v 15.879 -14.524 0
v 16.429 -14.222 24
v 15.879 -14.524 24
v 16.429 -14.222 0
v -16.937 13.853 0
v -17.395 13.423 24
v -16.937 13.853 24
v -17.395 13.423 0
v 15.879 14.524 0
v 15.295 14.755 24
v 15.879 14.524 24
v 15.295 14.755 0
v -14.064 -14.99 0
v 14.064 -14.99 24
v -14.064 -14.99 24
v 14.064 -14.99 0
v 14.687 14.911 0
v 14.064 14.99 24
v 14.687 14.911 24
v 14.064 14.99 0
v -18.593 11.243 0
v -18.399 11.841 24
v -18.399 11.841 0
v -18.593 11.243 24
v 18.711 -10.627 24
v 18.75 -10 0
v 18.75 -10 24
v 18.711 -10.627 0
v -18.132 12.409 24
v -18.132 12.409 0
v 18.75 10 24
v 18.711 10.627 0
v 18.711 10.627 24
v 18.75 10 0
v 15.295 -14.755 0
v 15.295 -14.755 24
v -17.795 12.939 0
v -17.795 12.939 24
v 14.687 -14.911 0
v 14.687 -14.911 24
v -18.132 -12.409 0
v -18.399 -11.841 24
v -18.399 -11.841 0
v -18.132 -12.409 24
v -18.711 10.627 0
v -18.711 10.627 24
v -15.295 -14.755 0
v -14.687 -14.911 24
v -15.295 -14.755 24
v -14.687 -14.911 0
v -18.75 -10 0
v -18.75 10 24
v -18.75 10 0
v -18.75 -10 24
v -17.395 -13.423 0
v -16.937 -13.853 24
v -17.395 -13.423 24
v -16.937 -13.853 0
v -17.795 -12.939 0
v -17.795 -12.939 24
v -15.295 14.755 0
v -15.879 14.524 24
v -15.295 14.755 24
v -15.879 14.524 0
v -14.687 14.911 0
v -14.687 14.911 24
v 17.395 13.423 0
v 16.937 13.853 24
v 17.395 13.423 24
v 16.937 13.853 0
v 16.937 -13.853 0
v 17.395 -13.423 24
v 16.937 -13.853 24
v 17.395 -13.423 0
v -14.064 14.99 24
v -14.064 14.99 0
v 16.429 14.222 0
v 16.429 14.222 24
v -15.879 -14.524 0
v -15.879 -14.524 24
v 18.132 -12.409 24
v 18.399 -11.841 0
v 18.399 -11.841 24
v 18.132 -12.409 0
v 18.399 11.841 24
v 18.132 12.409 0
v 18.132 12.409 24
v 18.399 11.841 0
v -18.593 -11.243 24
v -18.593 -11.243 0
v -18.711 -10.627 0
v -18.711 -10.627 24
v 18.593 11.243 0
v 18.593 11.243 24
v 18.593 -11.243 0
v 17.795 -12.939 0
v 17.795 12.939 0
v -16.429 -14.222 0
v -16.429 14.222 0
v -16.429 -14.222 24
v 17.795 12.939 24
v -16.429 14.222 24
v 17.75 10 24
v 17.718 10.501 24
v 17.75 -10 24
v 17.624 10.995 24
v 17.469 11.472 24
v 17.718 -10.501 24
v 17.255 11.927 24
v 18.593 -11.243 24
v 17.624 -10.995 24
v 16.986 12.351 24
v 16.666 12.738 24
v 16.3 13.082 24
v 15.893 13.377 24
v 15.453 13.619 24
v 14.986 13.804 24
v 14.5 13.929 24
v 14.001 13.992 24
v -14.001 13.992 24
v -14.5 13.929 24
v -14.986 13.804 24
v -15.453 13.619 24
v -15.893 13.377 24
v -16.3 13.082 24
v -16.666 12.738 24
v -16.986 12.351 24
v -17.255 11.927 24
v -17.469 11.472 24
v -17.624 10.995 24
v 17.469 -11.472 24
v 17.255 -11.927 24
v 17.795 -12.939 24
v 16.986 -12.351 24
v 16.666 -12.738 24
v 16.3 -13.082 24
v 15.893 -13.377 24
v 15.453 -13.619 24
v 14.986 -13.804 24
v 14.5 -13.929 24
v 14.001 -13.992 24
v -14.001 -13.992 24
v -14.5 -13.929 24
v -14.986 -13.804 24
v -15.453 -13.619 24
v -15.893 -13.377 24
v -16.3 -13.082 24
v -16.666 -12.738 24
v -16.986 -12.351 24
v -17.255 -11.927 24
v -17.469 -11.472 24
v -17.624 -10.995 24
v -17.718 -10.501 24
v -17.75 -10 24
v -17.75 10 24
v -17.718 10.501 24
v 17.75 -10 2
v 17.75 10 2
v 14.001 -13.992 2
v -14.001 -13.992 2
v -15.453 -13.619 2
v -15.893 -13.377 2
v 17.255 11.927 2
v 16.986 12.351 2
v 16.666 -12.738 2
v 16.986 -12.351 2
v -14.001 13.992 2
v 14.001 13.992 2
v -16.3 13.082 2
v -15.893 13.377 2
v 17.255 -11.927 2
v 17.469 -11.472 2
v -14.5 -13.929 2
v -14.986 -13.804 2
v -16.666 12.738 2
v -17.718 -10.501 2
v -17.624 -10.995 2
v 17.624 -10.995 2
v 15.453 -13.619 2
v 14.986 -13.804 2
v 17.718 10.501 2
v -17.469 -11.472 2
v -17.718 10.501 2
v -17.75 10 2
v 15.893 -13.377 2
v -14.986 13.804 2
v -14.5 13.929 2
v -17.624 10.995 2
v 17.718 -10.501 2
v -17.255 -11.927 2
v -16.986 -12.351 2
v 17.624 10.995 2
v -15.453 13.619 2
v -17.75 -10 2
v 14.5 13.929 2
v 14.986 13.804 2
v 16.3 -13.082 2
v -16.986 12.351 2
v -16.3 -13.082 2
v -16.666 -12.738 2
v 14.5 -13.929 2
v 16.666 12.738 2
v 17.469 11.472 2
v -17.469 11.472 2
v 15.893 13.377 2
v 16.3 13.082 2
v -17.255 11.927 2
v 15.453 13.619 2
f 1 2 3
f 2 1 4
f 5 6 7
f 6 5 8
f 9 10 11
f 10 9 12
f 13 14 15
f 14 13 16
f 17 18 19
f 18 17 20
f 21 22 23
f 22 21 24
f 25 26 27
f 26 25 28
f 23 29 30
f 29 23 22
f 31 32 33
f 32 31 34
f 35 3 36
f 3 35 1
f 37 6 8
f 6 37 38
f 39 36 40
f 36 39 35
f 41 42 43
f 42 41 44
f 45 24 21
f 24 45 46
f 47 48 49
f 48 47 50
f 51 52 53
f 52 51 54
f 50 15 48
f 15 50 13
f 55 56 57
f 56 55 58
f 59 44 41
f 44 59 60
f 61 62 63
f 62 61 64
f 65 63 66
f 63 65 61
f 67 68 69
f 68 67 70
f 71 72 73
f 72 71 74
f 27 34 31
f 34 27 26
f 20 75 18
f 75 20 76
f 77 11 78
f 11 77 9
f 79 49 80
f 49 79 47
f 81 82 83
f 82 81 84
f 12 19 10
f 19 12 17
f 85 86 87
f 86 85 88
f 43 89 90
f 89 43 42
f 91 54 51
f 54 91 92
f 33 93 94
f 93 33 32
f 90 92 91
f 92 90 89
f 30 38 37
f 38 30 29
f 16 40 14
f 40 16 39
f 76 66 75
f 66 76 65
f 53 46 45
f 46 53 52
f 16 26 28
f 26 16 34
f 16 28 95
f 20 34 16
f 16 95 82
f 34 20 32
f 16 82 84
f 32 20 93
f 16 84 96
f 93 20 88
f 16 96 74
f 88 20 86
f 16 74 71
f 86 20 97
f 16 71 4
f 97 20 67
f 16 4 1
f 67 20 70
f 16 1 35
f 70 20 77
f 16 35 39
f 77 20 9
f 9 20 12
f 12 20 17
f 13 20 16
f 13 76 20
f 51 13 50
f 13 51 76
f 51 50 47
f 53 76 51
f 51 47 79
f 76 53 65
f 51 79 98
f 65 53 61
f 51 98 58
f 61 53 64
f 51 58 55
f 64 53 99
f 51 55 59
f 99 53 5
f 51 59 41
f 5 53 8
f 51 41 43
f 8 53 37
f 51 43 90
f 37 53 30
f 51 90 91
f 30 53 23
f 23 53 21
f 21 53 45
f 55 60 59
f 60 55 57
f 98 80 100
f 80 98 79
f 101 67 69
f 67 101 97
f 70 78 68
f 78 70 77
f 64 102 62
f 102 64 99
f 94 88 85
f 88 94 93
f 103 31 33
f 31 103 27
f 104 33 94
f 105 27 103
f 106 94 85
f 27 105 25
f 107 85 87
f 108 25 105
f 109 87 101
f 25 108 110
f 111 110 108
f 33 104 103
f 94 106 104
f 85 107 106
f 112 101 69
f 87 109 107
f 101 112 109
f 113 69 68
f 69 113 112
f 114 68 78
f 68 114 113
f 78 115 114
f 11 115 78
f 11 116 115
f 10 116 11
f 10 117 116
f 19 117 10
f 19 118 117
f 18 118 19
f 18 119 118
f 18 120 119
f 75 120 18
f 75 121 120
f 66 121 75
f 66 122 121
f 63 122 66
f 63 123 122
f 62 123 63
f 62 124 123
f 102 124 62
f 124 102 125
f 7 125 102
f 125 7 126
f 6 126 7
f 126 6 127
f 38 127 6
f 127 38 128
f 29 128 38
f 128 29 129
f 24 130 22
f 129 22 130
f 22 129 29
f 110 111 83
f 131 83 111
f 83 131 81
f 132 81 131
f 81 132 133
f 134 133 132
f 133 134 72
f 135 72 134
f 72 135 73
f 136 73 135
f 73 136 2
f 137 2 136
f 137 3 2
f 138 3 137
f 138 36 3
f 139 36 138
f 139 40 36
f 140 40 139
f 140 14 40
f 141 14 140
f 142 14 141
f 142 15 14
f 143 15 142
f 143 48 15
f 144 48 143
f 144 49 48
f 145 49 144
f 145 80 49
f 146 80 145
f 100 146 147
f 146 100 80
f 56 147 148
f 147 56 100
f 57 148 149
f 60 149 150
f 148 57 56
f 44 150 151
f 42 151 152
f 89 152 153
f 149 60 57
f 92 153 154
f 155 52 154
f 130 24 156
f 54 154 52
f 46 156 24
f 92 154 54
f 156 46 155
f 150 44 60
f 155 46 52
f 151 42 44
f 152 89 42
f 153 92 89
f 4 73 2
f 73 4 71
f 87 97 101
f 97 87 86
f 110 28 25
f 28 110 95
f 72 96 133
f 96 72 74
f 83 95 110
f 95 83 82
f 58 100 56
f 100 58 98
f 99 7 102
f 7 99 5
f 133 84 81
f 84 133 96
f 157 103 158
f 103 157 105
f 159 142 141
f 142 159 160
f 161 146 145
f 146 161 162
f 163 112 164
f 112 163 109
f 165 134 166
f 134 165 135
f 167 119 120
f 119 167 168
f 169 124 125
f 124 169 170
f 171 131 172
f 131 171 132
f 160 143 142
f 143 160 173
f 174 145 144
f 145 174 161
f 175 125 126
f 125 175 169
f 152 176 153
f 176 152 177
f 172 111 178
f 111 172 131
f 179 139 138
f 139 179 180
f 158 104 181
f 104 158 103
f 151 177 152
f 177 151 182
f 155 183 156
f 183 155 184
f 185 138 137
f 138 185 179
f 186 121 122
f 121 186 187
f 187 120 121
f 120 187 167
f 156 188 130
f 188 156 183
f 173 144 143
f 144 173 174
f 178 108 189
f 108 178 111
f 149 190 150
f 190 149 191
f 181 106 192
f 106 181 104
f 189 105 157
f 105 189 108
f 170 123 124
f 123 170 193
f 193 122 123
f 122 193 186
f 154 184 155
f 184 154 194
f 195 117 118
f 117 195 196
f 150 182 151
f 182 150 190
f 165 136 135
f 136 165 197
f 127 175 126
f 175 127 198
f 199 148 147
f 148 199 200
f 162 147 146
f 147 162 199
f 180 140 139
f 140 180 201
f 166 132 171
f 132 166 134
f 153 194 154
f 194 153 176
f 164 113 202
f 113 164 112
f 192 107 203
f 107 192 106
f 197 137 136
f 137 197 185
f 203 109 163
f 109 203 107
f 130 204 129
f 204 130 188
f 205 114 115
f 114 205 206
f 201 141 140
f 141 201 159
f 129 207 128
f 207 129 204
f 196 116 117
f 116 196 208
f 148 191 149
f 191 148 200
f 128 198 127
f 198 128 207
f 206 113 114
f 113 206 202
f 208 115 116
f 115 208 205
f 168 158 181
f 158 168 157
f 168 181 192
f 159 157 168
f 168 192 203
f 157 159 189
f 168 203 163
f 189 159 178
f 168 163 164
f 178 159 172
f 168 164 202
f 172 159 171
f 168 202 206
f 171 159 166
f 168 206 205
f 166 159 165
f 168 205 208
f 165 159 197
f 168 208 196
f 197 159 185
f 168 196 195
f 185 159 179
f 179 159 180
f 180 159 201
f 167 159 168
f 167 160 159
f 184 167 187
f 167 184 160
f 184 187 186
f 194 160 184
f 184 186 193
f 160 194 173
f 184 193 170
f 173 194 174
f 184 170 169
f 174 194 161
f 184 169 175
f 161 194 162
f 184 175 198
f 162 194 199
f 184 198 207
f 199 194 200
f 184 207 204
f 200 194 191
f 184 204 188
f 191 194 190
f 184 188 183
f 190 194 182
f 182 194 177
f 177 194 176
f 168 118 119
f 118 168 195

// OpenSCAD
$fn = 50;


difference() {
	union() {
		hull() {
			translate(v = [-13.7500000000, 10.0000000000, 0]) {
				cylinder(h = 24, r = 5);
			}
			translate(v = [13.7500000000, 10.0000000000, 0]) {
				cylinder(h = 24, r = 5);
			}
			translate(v = [-13.7500000000, -10.0000000000, 0]) {
				cylinder(h = 24, r = 5);
			}
			translate(v = [13.7500000000, -10.0000000000, 0]) {
				cylinder(h = 24, r = 5);
			}
		}
	}
	union() {
		translate(v = [0, 0, 2]) {
			#hull() {
				translate(v = [-13.7500000000, 10.0000000000, 0]) {
					cylinder(h = 22, r = 4);
				}
				translate(v = [13.7500000000, 10.0000000000, 0]) {
					cylinder(h = 22, r = 4);
				}
				translate(v = [-13.7500000000, -10.0000000000, 0]) {
					cylinder(h = 22, r = 4);
				}
				translate(v = [13.7500000000, -10.0000000000, 0]) {
					cylinder(h = 22, r = 4);
				}
			}
		}
	}
}
